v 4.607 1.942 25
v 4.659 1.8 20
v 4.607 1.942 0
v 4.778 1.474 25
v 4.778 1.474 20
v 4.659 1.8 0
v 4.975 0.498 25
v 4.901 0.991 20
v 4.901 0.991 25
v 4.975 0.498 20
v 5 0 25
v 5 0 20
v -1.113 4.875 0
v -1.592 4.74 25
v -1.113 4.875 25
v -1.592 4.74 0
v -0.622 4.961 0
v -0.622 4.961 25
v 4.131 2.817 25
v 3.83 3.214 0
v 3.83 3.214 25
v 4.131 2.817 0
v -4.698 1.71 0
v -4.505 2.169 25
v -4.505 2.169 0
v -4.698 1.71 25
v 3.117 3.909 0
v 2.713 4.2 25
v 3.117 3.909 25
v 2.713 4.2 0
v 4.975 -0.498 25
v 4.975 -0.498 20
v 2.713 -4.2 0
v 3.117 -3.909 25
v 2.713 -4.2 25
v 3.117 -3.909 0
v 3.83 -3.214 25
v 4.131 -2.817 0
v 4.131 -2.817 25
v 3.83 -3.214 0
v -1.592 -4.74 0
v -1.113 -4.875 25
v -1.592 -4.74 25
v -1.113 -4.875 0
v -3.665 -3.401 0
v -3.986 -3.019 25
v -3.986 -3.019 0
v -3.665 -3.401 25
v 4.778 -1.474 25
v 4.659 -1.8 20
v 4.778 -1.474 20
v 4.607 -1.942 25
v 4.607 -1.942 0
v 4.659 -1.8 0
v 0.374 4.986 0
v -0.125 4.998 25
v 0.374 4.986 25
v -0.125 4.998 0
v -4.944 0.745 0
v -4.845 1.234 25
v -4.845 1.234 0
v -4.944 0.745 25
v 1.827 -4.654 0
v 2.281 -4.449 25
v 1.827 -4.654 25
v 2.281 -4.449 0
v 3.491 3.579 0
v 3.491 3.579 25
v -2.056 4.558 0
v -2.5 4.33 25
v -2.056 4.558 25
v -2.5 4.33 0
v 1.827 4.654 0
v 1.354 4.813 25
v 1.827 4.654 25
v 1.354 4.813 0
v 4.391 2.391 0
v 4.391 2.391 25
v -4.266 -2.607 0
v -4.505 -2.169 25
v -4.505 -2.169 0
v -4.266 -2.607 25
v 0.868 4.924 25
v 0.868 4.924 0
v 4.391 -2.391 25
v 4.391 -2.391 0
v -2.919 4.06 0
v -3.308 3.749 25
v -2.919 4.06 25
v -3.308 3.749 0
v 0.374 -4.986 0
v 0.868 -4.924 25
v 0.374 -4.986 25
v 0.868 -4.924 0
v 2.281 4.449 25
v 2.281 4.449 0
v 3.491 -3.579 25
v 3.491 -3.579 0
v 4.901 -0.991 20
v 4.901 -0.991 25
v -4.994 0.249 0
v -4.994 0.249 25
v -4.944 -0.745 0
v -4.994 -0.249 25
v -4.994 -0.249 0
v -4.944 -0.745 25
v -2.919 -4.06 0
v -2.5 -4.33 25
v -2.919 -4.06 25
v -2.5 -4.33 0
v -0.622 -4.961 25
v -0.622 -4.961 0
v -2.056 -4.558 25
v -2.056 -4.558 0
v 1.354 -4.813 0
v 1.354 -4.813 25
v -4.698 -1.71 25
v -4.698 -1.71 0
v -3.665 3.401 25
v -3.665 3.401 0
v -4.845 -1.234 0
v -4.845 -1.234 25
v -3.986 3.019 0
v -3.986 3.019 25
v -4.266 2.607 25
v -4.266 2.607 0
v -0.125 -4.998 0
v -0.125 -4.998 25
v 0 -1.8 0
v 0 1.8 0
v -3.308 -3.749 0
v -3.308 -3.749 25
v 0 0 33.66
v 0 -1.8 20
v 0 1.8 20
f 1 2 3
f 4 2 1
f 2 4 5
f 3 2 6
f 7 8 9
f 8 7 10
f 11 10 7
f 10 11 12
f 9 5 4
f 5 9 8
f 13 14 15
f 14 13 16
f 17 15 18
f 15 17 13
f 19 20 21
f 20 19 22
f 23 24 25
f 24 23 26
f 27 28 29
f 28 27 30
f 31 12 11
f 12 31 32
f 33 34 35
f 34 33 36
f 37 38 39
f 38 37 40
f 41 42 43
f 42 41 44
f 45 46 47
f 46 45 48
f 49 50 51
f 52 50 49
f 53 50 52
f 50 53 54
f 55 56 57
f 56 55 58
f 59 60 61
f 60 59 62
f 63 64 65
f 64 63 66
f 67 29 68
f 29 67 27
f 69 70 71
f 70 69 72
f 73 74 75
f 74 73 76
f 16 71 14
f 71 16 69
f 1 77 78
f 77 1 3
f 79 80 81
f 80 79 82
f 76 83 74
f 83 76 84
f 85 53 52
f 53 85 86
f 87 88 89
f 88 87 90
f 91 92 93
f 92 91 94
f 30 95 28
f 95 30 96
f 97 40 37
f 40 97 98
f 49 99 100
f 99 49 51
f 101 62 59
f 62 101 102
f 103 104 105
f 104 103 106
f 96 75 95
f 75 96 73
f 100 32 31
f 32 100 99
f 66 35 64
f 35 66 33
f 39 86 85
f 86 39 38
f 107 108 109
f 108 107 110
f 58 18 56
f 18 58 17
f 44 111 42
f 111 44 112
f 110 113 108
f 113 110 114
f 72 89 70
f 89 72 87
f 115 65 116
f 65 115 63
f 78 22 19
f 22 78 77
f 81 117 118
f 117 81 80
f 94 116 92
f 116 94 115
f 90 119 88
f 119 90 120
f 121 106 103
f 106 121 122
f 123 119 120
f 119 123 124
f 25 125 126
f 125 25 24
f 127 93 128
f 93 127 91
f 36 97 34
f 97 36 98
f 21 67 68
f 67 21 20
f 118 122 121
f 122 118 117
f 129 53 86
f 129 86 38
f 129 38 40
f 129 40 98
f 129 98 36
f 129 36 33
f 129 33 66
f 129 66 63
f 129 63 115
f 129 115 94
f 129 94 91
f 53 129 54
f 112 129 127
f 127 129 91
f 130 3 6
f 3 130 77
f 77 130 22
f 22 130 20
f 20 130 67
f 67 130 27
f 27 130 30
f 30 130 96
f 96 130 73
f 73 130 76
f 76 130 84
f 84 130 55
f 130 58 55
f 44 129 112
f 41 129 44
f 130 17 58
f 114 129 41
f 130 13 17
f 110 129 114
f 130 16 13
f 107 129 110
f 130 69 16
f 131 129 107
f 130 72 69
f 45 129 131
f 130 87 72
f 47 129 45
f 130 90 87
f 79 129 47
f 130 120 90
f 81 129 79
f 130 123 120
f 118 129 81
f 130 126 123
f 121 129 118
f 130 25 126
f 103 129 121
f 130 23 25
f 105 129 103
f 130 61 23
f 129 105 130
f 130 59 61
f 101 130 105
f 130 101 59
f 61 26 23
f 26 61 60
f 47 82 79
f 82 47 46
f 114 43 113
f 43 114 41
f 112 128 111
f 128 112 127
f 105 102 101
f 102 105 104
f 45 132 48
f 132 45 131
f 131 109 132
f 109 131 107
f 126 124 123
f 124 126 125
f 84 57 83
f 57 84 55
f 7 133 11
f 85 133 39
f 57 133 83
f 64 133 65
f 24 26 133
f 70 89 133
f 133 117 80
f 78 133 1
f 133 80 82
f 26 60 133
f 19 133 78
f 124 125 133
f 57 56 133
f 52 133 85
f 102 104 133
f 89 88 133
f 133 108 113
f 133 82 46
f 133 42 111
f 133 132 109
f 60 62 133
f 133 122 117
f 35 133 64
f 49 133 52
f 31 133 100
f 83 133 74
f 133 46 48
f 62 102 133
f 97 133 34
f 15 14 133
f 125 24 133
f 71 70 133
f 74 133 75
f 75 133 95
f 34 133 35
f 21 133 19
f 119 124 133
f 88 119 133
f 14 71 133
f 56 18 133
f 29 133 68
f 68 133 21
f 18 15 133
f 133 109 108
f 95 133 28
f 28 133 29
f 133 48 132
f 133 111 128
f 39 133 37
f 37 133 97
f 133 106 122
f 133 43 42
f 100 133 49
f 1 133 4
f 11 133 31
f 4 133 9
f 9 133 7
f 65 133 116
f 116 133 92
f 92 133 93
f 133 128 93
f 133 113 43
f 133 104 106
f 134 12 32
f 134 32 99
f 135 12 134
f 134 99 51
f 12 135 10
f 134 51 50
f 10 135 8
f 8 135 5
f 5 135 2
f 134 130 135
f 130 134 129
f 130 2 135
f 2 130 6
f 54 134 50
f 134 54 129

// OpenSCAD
// Outer diameter of cylinder.
od = 10;
// Length of main cylinder.
body_height = 25;
// Angle of the tip measured from vertical.
tip_half_angle = 30; // [30:60]
// Width of the gap to place caliper arm into.
gap_width = 3.6;
// Length of the caliper arm gap.
gap_height = 20;

/* [Hidden] */
// Make everything nice and round.
$fa = 5;
$fs = 0.5;

slop = 0.1;

difference() {
  union() {
    cylinder(h=body_height, r=od/2);
    translate([0, 0, body_height]) cylinder(h=od/2 / tan(tip_half_angle), r1=od/2, r2=0);
  }
  translate([0, -gap_width/2, -slop]) cube([od/2+slop, gap_width, gap_height+slop]);
}
